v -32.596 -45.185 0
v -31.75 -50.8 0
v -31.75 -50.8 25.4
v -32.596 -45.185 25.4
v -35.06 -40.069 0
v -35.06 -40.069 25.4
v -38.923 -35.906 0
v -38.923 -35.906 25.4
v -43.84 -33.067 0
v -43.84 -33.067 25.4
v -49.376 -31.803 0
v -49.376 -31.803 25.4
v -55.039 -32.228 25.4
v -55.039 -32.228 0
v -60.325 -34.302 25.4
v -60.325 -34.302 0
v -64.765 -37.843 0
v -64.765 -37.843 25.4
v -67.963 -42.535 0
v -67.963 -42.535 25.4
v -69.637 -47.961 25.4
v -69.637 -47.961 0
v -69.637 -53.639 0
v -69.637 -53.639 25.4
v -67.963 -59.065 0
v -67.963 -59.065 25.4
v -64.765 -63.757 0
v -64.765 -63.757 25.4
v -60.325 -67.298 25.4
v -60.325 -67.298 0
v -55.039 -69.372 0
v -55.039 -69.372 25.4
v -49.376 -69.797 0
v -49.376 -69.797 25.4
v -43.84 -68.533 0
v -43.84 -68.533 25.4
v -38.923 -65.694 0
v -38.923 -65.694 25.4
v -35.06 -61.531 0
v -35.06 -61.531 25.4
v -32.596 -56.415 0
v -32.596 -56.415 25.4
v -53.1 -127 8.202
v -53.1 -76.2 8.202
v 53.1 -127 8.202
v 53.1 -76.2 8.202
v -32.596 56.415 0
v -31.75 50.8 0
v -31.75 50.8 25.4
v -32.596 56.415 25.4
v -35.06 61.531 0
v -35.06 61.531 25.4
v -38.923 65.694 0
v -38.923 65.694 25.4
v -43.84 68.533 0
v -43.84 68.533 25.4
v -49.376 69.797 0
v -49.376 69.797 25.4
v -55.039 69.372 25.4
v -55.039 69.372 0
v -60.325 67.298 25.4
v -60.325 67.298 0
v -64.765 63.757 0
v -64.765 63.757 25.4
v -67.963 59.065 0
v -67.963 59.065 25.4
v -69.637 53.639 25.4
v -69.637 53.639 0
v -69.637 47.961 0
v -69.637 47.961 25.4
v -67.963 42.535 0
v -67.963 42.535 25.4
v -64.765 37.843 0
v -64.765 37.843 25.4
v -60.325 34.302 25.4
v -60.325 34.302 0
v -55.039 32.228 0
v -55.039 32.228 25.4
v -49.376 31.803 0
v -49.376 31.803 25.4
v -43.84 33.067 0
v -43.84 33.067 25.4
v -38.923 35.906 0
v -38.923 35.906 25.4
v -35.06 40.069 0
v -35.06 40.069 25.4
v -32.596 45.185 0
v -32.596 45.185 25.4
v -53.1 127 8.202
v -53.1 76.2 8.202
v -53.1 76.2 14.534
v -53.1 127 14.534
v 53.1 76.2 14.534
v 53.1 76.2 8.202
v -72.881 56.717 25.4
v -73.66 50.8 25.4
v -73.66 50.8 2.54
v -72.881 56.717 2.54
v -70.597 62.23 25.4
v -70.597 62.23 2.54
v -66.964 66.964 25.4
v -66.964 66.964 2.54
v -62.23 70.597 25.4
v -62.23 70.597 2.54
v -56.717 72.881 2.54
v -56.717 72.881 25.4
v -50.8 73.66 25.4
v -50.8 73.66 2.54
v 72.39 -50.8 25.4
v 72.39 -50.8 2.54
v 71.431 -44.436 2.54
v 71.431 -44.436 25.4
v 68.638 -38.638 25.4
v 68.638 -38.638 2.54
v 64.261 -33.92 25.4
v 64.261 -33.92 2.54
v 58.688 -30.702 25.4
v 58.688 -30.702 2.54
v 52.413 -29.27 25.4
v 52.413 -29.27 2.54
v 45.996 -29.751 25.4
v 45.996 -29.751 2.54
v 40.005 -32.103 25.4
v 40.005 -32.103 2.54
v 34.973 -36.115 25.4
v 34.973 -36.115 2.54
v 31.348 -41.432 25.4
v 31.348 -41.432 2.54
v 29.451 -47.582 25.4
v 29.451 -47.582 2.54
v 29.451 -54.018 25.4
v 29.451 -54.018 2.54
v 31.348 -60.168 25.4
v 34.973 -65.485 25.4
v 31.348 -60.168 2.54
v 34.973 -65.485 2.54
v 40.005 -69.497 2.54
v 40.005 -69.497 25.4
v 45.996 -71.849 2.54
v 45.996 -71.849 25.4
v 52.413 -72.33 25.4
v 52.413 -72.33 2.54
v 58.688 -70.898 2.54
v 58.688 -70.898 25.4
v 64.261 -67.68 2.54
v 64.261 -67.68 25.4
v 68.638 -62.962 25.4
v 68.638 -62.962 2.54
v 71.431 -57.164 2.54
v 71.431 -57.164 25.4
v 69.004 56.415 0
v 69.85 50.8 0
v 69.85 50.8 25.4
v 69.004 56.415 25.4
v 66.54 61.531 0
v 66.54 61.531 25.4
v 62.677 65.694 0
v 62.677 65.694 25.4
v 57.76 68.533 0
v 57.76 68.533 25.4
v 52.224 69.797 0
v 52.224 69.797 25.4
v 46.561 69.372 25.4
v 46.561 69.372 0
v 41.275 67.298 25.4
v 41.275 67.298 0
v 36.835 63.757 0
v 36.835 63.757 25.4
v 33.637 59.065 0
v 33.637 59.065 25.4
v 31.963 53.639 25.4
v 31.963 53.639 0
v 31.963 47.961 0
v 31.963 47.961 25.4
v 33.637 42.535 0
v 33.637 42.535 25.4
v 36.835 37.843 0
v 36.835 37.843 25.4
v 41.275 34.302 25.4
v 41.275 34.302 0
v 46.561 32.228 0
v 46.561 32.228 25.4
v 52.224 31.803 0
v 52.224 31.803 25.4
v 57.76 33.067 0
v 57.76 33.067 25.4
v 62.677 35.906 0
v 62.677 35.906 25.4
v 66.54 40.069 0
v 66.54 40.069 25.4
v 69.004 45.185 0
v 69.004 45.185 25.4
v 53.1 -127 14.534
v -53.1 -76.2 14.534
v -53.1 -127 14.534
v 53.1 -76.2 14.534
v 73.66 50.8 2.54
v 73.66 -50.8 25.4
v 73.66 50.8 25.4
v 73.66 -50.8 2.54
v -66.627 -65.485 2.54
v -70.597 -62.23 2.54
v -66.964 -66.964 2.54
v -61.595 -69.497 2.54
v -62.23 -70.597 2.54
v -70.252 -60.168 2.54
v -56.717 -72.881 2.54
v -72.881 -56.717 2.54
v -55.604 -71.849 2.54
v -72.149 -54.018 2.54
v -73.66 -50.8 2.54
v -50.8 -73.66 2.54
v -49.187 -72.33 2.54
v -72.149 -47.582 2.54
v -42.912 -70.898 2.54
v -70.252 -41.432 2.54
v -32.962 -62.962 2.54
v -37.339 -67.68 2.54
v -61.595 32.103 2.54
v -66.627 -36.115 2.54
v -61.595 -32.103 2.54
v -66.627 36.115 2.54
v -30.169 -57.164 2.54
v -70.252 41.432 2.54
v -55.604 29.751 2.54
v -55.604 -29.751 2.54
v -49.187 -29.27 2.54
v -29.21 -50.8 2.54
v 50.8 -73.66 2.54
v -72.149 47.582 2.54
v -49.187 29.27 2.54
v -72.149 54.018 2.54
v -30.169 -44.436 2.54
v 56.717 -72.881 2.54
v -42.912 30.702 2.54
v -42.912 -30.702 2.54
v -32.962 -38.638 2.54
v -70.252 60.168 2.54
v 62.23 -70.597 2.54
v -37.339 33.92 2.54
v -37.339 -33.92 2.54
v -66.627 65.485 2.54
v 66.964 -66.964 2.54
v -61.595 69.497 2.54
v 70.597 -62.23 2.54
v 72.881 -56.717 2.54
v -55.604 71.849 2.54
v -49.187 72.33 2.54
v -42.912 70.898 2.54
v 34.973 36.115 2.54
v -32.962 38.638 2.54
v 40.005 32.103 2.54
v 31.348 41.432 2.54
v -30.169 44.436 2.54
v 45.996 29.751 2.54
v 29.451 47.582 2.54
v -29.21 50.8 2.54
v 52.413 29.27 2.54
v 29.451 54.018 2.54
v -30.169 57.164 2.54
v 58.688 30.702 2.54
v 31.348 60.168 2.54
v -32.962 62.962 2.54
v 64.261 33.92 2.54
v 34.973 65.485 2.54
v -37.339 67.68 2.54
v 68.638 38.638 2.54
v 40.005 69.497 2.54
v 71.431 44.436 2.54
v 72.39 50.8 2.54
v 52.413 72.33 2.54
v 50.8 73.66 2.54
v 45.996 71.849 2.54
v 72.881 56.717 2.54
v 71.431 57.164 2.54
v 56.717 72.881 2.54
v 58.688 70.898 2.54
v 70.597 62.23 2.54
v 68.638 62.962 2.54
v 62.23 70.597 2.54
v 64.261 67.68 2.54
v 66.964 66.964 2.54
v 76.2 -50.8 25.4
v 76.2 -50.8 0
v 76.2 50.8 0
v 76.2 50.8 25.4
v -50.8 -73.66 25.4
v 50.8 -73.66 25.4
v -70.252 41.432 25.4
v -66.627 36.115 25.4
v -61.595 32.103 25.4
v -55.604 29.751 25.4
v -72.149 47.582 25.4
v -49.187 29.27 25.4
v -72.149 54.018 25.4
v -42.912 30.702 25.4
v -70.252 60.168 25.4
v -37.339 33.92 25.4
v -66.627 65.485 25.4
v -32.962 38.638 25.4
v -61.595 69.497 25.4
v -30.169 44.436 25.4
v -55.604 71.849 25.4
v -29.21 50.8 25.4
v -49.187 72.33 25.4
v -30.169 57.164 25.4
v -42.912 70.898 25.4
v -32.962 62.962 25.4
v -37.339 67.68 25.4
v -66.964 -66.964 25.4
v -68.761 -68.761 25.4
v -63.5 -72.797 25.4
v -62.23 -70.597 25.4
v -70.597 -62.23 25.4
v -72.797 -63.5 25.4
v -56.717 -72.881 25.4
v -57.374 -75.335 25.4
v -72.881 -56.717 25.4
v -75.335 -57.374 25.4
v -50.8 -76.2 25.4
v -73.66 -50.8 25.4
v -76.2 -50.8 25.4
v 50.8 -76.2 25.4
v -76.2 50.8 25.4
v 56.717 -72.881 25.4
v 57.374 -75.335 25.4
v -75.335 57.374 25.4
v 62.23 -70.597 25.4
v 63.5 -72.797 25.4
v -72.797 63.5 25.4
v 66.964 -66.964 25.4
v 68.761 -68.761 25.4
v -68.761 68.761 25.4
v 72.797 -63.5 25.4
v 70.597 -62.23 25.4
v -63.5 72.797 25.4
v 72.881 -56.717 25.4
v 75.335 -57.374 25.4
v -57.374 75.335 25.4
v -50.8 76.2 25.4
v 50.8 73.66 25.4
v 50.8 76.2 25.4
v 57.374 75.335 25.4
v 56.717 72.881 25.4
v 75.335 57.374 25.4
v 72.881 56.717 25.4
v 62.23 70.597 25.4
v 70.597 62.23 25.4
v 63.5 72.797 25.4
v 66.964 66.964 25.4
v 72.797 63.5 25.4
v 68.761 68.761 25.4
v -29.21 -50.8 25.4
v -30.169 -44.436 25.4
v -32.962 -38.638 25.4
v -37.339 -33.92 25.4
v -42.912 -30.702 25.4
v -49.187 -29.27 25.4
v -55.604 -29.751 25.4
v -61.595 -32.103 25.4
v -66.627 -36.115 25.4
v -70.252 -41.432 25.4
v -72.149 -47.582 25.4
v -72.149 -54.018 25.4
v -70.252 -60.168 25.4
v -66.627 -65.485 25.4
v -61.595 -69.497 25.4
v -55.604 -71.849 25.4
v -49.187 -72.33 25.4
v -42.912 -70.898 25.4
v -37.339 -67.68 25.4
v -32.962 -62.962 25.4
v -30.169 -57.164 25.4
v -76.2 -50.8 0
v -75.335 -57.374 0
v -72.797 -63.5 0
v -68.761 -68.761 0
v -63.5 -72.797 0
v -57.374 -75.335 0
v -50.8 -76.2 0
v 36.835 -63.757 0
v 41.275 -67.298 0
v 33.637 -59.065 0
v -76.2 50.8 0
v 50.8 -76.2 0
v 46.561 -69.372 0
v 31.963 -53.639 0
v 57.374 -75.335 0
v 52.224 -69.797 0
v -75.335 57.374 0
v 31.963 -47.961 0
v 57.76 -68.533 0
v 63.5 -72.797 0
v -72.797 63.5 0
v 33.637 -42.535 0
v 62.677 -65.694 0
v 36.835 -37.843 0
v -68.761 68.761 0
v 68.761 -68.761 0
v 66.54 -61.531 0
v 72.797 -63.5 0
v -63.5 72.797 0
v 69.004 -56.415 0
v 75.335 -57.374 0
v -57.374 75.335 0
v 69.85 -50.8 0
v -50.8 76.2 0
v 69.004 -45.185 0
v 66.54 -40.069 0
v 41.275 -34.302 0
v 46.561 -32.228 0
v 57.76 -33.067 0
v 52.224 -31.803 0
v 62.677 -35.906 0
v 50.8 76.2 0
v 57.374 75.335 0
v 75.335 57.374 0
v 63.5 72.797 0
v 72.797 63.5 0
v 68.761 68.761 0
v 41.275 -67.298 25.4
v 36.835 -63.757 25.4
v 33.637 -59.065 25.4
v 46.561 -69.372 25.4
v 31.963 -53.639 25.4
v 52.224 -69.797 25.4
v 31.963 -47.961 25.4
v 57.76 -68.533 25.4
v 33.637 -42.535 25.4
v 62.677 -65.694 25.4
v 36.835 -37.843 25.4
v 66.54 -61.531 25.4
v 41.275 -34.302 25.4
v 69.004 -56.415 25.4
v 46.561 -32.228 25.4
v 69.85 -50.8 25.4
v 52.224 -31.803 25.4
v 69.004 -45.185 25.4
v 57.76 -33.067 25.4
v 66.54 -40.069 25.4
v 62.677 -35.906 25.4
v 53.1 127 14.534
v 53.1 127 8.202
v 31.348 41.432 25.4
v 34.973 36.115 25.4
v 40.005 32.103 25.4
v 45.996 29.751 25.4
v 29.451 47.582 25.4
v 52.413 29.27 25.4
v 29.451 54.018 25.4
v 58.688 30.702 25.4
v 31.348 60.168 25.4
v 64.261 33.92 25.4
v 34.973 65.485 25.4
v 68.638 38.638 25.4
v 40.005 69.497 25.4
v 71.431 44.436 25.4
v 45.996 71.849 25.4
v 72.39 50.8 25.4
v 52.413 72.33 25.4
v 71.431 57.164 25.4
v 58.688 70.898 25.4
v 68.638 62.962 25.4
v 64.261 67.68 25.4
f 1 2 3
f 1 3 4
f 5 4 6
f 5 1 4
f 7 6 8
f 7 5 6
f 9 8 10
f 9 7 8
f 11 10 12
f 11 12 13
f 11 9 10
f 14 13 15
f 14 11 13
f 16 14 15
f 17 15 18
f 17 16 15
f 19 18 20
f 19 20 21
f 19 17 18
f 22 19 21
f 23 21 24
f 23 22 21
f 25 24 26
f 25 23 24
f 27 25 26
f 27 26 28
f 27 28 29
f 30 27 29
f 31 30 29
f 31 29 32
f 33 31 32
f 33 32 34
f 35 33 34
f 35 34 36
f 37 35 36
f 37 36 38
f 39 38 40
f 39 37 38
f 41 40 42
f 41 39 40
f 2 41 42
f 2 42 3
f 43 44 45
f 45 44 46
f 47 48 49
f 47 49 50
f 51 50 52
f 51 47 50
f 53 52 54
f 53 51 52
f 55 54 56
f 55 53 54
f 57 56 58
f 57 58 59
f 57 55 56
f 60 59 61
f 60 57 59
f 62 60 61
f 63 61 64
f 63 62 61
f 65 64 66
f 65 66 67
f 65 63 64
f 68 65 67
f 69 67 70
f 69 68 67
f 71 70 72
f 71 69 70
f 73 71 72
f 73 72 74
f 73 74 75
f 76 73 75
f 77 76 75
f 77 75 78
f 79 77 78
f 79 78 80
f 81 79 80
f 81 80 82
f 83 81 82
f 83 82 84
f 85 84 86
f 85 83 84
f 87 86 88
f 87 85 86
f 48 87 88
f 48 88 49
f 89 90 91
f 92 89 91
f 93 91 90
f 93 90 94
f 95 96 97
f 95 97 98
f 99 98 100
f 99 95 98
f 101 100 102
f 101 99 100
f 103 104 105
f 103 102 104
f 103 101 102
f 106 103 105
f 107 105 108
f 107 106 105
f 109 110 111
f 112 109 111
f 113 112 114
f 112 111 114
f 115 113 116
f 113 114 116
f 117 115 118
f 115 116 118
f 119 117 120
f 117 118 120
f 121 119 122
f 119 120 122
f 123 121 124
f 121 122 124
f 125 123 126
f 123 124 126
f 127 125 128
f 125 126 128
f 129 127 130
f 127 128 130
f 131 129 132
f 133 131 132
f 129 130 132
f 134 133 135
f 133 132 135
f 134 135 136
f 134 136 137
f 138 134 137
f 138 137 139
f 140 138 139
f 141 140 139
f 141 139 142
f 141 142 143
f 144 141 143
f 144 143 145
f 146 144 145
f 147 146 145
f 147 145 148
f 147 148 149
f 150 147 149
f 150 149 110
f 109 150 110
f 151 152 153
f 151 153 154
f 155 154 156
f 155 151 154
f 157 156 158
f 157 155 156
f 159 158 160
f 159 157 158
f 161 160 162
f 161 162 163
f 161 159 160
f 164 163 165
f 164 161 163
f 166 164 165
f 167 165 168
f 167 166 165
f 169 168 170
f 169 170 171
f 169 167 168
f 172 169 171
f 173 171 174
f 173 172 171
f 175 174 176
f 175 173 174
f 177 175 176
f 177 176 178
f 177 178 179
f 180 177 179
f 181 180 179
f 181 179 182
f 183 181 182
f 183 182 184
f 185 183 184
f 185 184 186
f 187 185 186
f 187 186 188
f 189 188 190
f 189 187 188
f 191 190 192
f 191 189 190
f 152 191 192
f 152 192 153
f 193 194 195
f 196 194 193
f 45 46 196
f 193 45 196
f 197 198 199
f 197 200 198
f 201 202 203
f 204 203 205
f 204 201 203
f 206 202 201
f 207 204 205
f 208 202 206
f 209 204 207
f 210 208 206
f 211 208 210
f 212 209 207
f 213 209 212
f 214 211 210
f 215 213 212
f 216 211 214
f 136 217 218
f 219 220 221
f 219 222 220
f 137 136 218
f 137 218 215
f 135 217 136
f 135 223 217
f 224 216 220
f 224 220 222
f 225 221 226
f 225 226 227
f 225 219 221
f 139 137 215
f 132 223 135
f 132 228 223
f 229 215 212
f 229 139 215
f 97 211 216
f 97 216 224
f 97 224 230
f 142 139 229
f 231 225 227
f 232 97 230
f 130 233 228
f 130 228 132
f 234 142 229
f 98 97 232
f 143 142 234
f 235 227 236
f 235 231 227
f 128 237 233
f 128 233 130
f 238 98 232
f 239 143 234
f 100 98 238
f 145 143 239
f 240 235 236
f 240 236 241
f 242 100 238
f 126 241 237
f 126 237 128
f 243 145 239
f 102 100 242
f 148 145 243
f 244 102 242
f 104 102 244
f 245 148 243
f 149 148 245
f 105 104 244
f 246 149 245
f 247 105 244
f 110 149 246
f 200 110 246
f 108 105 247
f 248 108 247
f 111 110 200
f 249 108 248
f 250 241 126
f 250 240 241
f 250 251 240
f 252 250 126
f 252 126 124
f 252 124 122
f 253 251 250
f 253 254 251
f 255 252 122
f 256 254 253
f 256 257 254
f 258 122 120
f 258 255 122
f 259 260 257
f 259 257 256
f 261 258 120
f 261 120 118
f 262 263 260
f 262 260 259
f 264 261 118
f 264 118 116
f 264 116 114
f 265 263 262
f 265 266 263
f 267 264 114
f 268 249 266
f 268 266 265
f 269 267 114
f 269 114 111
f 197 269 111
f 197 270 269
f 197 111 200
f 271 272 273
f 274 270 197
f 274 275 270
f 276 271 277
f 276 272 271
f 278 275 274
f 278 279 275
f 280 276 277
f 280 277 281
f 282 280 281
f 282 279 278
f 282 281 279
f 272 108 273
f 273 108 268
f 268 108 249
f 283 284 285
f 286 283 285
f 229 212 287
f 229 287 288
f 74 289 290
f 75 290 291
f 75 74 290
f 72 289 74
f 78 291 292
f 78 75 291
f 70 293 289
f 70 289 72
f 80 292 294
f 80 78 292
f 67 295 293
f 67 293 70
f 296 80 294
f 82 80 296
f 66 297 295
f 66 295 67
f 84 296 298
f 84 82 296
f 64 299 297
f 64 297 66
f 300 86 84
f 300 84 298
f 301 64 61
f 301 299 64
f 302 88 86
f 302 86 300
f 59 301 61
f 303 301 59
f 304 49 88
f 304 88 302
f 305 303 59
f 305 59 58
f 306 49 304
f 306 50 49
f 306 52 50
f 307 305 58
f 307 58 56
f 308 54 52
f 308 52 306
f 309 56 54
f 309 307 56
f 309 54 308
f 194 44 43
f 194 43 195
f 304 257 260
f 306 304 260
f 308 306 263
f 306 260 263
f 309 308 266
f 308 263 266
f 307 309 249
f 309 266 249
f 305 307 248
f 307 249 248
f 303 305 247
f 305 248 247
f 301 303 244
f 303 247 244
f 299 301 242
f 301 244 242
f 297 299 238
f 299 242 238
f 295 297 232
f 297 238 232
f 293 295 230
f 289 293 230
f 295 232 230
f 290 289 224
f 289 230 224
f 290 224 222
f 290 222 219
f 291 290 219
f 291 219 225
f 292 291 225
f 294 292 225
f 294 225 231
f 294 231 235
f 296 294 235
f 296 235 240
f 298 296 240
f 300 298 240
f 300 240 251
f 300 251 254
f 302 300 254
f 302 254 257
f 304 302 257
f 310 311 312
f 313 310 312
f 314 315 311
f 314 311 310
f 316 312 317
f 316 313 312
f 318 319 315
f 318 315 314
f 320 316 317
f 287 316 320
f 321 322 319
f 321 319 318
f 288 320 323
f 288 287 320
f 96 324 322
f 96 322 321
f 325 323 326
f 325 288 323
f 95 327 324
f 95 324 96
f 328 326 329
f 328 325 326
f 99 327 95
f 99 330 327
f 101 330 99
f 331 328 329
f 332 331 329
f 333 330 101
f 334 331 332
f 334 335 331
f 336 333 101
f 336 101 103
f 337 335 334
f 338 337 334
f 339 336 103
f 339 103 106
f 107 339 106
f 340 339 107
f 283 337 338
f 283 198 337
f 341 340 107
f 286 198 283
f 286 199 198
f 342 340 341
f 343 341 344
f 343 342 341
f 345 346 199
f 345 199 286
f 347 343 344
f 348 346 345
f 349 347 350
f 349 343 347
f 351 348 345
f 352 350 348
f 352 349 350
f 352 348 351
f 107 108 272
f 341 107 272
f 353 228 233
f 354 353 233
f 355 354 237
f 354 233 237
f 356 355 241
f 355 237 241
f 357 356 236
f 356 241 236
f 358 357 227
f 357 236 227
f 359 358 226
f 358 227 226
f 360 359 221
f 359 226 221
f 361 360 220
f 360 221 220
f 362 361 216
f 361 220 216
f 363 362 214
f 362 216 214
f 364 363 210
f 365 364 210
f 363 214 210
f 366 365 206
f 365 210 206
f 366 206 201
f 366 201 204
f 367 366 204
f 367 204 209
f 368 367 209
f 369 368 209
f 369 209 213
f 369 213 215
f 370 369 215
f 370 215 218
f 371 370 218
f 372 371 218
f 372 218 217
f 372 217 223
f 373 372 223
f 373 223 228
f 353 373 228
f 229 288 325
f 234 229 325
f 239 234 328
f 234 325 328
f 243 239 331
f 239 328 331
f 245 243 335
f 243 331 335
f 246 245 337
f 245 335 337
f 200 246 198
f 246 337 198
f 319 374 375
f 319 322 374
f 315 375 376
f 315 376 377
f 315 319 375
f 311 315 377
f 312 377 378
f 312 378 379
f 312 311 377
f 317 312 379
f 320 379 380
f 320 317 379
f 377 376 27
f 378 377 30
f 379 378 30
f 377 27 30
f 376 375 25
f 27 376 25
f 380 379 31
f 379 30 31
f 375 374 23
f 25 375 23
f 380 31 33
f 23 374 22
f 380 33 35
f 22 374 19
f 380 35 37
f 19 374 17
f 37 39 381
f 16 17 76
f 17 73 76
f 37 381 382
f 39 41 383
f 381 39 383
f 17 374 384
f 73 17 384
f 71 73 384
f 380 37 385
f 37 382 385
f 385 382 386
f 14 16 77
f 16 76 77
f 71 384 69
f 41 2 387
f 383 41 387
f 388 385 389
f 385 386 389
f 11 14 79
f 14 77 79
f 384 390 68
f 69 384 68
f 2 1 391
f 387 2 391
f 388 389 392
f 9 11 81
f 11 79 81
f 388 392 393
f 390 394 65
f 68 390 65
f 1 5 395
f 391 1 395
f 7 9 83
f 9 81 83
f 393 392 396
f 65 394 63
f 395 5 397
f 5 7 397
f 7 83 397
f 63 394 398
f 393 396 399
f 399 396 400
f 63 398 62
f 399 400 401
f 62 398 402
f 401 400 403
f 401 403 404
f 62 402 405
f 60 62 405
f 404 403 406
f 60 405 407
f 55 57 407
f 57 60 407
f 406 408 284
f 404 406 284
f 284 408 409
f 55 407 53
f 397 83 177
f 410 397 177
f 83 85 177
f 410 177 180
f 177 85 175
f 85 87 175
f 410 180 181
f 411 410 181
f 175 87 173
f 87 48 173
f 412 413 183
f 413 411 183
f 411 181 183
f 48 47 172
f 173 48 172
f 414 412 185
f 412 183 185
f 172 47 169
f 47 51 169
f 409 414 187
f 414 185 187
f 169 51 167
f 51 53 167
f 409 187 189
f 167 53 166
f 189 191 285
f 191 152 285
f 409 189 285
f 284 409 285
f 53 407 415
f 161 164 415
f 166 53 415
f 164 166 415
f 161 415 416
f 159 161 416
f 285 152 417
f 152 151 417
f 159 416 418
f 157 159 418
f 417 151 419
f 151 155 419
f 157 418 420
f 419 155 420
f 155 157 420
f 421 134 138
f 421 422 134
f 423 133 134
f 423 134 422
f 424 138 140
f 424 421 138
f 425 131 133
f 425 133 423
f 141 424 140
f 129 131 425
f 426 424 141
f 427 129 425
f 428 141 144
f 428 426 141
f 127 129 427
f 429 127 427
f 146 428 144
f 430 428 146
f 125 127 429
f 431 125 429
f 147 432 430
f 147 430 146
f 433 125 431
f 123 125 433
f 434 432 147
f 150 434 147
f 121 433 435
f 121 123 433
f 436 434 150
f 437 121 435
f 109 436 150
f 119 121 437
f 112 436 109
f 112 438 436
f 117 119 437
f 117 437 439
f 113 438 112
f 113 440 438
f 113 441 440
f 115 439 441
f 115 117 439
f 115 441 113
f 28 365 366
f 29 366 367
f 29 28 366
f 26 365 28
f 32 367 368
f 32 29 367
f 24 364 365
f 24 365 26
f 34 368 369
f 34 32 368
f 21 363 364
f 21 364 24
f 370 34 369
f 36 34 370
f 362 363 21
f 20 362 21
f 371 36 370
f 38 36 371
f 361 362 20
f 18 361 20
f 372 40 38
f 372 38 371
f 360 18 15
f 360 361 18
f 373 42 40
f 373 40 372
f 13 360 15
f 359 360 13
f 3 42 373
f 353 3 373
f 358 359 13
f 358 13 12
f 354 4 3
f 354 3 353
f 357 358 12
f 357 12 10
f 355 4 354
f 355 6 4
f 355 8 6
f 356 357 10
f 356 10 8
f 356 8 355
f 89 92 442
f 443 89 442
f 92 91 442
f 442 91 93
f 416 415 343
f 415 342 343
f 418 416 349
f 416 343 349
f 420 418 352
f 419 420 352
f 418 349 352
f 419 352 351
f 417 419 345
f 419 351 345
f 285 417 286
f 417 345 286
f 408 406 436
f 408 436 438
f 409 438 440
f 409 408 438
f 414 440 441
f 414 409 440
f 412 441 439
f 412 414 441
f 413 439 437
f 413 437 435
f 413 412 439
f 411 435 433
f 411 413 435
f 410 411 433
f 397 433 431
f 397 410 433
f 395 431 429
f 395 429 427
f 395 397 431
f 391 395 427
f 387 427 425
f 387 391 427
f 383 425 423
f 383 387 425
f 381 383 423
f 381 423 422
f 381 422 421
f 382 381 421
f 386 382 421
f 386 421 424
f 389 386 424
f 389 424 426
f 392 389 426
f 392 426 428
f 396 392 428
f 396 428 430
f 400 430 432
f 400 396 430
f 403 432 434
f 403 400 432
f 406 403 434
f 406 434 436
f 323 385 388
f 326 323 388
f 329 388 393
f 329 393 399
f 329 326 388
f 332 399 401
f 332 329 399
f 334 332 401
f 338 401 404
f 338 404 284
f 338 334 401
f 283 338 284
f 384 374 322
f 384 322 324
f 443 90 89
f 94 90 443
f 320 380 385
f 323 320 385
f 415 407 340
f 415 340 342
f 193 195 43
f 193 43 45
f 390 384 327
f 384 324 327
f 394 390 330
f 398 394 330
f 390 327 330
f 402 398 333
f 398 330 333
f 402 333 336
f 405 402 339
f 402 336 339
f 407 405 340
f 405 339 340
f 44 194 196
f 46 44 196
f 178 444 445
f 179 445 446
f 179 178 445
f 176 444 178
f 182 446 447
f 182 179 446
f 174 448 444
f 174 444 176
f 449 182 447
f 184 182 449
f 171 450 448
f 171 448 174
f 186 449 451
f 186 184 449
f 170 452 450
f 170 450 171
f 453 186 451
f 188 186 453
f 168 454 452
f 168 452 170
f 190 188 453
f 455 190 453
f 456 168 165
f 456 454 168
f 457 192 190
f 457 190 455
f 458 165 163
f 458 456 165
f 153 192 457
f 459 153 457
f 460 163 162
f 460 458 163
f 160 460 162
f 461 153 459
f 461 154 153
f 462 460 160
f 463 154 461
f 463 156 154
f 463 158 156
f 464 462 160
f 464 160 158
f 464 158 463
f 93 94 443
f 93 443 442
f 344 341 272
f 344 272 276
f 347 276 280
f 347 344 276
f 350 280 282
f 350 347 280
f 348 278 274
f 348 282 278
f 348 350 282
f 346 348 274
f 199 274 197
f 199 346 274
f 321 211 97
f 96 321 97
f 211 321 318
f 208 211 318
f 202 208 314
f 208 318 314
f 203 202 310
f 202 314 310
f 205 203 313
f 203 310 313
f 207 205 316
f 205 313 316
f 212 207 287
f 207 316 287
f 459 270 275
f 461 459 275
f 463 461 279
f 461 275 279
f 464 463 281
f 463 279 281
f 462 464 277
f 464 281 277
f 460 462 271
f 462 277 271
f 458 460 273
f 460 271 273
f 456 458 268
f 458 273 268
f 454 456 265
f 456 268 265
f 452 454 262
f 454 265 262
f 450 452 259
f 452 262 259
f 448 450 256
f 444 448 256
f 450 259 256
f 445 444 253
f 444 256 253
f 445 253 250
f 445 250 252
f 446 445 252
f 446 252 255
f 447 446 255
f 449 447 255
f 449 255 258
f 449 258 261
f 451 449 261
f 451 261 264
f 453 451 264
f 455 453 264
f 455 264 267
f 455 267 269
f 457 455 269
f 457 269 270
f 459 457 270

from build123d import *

# Parameters (mm, degrees)
F0_W     = 152.4
F0_H     = 152.4
F0_R     = 19.05
F1_DEPTH = 25.4
F2_W     = 106.200316
F2_H     = 6.331729
F3_DEPTH = 50.8
F5_R     = 25.4
F6_T     = -2.54


with BuildPart() as f1:
    # F0 (on Top) → F1 (new body)
    with BuildSketch(Plane.XY):
        Rectangle(F0_W, F0_H)
        with Locations((-50.8, -50.8)):
            Circle(F0_R, mode=Mode.SUBTRACT)
        with Locations((50.8, -50.8)):
            Circle(F0_R, mode=Mode.SUBTRACT)
        with Locations((-50.8, 50.8)):
            Circle(F0_R, mode=Mode.SUBTRACT)
        with Locations((50.8, 50.8)):
            Circle(F0_R, mode=Mode.SUBTRACT)
    extrude(amount=F1_DEPTH)

    # F5
    f5_edges = [f1.edges().sort_by_distance(p)[0] for p in [
        (76.2, -76.2, 12.7),
        (76.2, 76.2, 12.7),
        (-76.2, -76.2, 12.7),
        (-76.2, 76.2, 12.7),
    ]]
    fillet(f5_edges, radius=F5_R)

    # F6
    f6_openings = [f1.faces().sort_by_distance(p)[0] for p in [
        (0, 0, 25.4),
    ]]
    offset(amount=F6_T, openings=f6_openings)


with BuildPart() as f3:
    # F2 (on face) → F3 (new body)
    with BuildSketch(Plane.XZ.offset(76.2)):
        with Locations((0, 11.368326)):
            Rectangle(F2_W, F2_H)
    extrude(amount=F3_DEPTH)


with BuildPart() as f4_1:
    # F4: instance of F3
    add(f3.part.mirror(Plane.XZ))


solid = Compound([f1.part, f3.part, f4_1.part])
